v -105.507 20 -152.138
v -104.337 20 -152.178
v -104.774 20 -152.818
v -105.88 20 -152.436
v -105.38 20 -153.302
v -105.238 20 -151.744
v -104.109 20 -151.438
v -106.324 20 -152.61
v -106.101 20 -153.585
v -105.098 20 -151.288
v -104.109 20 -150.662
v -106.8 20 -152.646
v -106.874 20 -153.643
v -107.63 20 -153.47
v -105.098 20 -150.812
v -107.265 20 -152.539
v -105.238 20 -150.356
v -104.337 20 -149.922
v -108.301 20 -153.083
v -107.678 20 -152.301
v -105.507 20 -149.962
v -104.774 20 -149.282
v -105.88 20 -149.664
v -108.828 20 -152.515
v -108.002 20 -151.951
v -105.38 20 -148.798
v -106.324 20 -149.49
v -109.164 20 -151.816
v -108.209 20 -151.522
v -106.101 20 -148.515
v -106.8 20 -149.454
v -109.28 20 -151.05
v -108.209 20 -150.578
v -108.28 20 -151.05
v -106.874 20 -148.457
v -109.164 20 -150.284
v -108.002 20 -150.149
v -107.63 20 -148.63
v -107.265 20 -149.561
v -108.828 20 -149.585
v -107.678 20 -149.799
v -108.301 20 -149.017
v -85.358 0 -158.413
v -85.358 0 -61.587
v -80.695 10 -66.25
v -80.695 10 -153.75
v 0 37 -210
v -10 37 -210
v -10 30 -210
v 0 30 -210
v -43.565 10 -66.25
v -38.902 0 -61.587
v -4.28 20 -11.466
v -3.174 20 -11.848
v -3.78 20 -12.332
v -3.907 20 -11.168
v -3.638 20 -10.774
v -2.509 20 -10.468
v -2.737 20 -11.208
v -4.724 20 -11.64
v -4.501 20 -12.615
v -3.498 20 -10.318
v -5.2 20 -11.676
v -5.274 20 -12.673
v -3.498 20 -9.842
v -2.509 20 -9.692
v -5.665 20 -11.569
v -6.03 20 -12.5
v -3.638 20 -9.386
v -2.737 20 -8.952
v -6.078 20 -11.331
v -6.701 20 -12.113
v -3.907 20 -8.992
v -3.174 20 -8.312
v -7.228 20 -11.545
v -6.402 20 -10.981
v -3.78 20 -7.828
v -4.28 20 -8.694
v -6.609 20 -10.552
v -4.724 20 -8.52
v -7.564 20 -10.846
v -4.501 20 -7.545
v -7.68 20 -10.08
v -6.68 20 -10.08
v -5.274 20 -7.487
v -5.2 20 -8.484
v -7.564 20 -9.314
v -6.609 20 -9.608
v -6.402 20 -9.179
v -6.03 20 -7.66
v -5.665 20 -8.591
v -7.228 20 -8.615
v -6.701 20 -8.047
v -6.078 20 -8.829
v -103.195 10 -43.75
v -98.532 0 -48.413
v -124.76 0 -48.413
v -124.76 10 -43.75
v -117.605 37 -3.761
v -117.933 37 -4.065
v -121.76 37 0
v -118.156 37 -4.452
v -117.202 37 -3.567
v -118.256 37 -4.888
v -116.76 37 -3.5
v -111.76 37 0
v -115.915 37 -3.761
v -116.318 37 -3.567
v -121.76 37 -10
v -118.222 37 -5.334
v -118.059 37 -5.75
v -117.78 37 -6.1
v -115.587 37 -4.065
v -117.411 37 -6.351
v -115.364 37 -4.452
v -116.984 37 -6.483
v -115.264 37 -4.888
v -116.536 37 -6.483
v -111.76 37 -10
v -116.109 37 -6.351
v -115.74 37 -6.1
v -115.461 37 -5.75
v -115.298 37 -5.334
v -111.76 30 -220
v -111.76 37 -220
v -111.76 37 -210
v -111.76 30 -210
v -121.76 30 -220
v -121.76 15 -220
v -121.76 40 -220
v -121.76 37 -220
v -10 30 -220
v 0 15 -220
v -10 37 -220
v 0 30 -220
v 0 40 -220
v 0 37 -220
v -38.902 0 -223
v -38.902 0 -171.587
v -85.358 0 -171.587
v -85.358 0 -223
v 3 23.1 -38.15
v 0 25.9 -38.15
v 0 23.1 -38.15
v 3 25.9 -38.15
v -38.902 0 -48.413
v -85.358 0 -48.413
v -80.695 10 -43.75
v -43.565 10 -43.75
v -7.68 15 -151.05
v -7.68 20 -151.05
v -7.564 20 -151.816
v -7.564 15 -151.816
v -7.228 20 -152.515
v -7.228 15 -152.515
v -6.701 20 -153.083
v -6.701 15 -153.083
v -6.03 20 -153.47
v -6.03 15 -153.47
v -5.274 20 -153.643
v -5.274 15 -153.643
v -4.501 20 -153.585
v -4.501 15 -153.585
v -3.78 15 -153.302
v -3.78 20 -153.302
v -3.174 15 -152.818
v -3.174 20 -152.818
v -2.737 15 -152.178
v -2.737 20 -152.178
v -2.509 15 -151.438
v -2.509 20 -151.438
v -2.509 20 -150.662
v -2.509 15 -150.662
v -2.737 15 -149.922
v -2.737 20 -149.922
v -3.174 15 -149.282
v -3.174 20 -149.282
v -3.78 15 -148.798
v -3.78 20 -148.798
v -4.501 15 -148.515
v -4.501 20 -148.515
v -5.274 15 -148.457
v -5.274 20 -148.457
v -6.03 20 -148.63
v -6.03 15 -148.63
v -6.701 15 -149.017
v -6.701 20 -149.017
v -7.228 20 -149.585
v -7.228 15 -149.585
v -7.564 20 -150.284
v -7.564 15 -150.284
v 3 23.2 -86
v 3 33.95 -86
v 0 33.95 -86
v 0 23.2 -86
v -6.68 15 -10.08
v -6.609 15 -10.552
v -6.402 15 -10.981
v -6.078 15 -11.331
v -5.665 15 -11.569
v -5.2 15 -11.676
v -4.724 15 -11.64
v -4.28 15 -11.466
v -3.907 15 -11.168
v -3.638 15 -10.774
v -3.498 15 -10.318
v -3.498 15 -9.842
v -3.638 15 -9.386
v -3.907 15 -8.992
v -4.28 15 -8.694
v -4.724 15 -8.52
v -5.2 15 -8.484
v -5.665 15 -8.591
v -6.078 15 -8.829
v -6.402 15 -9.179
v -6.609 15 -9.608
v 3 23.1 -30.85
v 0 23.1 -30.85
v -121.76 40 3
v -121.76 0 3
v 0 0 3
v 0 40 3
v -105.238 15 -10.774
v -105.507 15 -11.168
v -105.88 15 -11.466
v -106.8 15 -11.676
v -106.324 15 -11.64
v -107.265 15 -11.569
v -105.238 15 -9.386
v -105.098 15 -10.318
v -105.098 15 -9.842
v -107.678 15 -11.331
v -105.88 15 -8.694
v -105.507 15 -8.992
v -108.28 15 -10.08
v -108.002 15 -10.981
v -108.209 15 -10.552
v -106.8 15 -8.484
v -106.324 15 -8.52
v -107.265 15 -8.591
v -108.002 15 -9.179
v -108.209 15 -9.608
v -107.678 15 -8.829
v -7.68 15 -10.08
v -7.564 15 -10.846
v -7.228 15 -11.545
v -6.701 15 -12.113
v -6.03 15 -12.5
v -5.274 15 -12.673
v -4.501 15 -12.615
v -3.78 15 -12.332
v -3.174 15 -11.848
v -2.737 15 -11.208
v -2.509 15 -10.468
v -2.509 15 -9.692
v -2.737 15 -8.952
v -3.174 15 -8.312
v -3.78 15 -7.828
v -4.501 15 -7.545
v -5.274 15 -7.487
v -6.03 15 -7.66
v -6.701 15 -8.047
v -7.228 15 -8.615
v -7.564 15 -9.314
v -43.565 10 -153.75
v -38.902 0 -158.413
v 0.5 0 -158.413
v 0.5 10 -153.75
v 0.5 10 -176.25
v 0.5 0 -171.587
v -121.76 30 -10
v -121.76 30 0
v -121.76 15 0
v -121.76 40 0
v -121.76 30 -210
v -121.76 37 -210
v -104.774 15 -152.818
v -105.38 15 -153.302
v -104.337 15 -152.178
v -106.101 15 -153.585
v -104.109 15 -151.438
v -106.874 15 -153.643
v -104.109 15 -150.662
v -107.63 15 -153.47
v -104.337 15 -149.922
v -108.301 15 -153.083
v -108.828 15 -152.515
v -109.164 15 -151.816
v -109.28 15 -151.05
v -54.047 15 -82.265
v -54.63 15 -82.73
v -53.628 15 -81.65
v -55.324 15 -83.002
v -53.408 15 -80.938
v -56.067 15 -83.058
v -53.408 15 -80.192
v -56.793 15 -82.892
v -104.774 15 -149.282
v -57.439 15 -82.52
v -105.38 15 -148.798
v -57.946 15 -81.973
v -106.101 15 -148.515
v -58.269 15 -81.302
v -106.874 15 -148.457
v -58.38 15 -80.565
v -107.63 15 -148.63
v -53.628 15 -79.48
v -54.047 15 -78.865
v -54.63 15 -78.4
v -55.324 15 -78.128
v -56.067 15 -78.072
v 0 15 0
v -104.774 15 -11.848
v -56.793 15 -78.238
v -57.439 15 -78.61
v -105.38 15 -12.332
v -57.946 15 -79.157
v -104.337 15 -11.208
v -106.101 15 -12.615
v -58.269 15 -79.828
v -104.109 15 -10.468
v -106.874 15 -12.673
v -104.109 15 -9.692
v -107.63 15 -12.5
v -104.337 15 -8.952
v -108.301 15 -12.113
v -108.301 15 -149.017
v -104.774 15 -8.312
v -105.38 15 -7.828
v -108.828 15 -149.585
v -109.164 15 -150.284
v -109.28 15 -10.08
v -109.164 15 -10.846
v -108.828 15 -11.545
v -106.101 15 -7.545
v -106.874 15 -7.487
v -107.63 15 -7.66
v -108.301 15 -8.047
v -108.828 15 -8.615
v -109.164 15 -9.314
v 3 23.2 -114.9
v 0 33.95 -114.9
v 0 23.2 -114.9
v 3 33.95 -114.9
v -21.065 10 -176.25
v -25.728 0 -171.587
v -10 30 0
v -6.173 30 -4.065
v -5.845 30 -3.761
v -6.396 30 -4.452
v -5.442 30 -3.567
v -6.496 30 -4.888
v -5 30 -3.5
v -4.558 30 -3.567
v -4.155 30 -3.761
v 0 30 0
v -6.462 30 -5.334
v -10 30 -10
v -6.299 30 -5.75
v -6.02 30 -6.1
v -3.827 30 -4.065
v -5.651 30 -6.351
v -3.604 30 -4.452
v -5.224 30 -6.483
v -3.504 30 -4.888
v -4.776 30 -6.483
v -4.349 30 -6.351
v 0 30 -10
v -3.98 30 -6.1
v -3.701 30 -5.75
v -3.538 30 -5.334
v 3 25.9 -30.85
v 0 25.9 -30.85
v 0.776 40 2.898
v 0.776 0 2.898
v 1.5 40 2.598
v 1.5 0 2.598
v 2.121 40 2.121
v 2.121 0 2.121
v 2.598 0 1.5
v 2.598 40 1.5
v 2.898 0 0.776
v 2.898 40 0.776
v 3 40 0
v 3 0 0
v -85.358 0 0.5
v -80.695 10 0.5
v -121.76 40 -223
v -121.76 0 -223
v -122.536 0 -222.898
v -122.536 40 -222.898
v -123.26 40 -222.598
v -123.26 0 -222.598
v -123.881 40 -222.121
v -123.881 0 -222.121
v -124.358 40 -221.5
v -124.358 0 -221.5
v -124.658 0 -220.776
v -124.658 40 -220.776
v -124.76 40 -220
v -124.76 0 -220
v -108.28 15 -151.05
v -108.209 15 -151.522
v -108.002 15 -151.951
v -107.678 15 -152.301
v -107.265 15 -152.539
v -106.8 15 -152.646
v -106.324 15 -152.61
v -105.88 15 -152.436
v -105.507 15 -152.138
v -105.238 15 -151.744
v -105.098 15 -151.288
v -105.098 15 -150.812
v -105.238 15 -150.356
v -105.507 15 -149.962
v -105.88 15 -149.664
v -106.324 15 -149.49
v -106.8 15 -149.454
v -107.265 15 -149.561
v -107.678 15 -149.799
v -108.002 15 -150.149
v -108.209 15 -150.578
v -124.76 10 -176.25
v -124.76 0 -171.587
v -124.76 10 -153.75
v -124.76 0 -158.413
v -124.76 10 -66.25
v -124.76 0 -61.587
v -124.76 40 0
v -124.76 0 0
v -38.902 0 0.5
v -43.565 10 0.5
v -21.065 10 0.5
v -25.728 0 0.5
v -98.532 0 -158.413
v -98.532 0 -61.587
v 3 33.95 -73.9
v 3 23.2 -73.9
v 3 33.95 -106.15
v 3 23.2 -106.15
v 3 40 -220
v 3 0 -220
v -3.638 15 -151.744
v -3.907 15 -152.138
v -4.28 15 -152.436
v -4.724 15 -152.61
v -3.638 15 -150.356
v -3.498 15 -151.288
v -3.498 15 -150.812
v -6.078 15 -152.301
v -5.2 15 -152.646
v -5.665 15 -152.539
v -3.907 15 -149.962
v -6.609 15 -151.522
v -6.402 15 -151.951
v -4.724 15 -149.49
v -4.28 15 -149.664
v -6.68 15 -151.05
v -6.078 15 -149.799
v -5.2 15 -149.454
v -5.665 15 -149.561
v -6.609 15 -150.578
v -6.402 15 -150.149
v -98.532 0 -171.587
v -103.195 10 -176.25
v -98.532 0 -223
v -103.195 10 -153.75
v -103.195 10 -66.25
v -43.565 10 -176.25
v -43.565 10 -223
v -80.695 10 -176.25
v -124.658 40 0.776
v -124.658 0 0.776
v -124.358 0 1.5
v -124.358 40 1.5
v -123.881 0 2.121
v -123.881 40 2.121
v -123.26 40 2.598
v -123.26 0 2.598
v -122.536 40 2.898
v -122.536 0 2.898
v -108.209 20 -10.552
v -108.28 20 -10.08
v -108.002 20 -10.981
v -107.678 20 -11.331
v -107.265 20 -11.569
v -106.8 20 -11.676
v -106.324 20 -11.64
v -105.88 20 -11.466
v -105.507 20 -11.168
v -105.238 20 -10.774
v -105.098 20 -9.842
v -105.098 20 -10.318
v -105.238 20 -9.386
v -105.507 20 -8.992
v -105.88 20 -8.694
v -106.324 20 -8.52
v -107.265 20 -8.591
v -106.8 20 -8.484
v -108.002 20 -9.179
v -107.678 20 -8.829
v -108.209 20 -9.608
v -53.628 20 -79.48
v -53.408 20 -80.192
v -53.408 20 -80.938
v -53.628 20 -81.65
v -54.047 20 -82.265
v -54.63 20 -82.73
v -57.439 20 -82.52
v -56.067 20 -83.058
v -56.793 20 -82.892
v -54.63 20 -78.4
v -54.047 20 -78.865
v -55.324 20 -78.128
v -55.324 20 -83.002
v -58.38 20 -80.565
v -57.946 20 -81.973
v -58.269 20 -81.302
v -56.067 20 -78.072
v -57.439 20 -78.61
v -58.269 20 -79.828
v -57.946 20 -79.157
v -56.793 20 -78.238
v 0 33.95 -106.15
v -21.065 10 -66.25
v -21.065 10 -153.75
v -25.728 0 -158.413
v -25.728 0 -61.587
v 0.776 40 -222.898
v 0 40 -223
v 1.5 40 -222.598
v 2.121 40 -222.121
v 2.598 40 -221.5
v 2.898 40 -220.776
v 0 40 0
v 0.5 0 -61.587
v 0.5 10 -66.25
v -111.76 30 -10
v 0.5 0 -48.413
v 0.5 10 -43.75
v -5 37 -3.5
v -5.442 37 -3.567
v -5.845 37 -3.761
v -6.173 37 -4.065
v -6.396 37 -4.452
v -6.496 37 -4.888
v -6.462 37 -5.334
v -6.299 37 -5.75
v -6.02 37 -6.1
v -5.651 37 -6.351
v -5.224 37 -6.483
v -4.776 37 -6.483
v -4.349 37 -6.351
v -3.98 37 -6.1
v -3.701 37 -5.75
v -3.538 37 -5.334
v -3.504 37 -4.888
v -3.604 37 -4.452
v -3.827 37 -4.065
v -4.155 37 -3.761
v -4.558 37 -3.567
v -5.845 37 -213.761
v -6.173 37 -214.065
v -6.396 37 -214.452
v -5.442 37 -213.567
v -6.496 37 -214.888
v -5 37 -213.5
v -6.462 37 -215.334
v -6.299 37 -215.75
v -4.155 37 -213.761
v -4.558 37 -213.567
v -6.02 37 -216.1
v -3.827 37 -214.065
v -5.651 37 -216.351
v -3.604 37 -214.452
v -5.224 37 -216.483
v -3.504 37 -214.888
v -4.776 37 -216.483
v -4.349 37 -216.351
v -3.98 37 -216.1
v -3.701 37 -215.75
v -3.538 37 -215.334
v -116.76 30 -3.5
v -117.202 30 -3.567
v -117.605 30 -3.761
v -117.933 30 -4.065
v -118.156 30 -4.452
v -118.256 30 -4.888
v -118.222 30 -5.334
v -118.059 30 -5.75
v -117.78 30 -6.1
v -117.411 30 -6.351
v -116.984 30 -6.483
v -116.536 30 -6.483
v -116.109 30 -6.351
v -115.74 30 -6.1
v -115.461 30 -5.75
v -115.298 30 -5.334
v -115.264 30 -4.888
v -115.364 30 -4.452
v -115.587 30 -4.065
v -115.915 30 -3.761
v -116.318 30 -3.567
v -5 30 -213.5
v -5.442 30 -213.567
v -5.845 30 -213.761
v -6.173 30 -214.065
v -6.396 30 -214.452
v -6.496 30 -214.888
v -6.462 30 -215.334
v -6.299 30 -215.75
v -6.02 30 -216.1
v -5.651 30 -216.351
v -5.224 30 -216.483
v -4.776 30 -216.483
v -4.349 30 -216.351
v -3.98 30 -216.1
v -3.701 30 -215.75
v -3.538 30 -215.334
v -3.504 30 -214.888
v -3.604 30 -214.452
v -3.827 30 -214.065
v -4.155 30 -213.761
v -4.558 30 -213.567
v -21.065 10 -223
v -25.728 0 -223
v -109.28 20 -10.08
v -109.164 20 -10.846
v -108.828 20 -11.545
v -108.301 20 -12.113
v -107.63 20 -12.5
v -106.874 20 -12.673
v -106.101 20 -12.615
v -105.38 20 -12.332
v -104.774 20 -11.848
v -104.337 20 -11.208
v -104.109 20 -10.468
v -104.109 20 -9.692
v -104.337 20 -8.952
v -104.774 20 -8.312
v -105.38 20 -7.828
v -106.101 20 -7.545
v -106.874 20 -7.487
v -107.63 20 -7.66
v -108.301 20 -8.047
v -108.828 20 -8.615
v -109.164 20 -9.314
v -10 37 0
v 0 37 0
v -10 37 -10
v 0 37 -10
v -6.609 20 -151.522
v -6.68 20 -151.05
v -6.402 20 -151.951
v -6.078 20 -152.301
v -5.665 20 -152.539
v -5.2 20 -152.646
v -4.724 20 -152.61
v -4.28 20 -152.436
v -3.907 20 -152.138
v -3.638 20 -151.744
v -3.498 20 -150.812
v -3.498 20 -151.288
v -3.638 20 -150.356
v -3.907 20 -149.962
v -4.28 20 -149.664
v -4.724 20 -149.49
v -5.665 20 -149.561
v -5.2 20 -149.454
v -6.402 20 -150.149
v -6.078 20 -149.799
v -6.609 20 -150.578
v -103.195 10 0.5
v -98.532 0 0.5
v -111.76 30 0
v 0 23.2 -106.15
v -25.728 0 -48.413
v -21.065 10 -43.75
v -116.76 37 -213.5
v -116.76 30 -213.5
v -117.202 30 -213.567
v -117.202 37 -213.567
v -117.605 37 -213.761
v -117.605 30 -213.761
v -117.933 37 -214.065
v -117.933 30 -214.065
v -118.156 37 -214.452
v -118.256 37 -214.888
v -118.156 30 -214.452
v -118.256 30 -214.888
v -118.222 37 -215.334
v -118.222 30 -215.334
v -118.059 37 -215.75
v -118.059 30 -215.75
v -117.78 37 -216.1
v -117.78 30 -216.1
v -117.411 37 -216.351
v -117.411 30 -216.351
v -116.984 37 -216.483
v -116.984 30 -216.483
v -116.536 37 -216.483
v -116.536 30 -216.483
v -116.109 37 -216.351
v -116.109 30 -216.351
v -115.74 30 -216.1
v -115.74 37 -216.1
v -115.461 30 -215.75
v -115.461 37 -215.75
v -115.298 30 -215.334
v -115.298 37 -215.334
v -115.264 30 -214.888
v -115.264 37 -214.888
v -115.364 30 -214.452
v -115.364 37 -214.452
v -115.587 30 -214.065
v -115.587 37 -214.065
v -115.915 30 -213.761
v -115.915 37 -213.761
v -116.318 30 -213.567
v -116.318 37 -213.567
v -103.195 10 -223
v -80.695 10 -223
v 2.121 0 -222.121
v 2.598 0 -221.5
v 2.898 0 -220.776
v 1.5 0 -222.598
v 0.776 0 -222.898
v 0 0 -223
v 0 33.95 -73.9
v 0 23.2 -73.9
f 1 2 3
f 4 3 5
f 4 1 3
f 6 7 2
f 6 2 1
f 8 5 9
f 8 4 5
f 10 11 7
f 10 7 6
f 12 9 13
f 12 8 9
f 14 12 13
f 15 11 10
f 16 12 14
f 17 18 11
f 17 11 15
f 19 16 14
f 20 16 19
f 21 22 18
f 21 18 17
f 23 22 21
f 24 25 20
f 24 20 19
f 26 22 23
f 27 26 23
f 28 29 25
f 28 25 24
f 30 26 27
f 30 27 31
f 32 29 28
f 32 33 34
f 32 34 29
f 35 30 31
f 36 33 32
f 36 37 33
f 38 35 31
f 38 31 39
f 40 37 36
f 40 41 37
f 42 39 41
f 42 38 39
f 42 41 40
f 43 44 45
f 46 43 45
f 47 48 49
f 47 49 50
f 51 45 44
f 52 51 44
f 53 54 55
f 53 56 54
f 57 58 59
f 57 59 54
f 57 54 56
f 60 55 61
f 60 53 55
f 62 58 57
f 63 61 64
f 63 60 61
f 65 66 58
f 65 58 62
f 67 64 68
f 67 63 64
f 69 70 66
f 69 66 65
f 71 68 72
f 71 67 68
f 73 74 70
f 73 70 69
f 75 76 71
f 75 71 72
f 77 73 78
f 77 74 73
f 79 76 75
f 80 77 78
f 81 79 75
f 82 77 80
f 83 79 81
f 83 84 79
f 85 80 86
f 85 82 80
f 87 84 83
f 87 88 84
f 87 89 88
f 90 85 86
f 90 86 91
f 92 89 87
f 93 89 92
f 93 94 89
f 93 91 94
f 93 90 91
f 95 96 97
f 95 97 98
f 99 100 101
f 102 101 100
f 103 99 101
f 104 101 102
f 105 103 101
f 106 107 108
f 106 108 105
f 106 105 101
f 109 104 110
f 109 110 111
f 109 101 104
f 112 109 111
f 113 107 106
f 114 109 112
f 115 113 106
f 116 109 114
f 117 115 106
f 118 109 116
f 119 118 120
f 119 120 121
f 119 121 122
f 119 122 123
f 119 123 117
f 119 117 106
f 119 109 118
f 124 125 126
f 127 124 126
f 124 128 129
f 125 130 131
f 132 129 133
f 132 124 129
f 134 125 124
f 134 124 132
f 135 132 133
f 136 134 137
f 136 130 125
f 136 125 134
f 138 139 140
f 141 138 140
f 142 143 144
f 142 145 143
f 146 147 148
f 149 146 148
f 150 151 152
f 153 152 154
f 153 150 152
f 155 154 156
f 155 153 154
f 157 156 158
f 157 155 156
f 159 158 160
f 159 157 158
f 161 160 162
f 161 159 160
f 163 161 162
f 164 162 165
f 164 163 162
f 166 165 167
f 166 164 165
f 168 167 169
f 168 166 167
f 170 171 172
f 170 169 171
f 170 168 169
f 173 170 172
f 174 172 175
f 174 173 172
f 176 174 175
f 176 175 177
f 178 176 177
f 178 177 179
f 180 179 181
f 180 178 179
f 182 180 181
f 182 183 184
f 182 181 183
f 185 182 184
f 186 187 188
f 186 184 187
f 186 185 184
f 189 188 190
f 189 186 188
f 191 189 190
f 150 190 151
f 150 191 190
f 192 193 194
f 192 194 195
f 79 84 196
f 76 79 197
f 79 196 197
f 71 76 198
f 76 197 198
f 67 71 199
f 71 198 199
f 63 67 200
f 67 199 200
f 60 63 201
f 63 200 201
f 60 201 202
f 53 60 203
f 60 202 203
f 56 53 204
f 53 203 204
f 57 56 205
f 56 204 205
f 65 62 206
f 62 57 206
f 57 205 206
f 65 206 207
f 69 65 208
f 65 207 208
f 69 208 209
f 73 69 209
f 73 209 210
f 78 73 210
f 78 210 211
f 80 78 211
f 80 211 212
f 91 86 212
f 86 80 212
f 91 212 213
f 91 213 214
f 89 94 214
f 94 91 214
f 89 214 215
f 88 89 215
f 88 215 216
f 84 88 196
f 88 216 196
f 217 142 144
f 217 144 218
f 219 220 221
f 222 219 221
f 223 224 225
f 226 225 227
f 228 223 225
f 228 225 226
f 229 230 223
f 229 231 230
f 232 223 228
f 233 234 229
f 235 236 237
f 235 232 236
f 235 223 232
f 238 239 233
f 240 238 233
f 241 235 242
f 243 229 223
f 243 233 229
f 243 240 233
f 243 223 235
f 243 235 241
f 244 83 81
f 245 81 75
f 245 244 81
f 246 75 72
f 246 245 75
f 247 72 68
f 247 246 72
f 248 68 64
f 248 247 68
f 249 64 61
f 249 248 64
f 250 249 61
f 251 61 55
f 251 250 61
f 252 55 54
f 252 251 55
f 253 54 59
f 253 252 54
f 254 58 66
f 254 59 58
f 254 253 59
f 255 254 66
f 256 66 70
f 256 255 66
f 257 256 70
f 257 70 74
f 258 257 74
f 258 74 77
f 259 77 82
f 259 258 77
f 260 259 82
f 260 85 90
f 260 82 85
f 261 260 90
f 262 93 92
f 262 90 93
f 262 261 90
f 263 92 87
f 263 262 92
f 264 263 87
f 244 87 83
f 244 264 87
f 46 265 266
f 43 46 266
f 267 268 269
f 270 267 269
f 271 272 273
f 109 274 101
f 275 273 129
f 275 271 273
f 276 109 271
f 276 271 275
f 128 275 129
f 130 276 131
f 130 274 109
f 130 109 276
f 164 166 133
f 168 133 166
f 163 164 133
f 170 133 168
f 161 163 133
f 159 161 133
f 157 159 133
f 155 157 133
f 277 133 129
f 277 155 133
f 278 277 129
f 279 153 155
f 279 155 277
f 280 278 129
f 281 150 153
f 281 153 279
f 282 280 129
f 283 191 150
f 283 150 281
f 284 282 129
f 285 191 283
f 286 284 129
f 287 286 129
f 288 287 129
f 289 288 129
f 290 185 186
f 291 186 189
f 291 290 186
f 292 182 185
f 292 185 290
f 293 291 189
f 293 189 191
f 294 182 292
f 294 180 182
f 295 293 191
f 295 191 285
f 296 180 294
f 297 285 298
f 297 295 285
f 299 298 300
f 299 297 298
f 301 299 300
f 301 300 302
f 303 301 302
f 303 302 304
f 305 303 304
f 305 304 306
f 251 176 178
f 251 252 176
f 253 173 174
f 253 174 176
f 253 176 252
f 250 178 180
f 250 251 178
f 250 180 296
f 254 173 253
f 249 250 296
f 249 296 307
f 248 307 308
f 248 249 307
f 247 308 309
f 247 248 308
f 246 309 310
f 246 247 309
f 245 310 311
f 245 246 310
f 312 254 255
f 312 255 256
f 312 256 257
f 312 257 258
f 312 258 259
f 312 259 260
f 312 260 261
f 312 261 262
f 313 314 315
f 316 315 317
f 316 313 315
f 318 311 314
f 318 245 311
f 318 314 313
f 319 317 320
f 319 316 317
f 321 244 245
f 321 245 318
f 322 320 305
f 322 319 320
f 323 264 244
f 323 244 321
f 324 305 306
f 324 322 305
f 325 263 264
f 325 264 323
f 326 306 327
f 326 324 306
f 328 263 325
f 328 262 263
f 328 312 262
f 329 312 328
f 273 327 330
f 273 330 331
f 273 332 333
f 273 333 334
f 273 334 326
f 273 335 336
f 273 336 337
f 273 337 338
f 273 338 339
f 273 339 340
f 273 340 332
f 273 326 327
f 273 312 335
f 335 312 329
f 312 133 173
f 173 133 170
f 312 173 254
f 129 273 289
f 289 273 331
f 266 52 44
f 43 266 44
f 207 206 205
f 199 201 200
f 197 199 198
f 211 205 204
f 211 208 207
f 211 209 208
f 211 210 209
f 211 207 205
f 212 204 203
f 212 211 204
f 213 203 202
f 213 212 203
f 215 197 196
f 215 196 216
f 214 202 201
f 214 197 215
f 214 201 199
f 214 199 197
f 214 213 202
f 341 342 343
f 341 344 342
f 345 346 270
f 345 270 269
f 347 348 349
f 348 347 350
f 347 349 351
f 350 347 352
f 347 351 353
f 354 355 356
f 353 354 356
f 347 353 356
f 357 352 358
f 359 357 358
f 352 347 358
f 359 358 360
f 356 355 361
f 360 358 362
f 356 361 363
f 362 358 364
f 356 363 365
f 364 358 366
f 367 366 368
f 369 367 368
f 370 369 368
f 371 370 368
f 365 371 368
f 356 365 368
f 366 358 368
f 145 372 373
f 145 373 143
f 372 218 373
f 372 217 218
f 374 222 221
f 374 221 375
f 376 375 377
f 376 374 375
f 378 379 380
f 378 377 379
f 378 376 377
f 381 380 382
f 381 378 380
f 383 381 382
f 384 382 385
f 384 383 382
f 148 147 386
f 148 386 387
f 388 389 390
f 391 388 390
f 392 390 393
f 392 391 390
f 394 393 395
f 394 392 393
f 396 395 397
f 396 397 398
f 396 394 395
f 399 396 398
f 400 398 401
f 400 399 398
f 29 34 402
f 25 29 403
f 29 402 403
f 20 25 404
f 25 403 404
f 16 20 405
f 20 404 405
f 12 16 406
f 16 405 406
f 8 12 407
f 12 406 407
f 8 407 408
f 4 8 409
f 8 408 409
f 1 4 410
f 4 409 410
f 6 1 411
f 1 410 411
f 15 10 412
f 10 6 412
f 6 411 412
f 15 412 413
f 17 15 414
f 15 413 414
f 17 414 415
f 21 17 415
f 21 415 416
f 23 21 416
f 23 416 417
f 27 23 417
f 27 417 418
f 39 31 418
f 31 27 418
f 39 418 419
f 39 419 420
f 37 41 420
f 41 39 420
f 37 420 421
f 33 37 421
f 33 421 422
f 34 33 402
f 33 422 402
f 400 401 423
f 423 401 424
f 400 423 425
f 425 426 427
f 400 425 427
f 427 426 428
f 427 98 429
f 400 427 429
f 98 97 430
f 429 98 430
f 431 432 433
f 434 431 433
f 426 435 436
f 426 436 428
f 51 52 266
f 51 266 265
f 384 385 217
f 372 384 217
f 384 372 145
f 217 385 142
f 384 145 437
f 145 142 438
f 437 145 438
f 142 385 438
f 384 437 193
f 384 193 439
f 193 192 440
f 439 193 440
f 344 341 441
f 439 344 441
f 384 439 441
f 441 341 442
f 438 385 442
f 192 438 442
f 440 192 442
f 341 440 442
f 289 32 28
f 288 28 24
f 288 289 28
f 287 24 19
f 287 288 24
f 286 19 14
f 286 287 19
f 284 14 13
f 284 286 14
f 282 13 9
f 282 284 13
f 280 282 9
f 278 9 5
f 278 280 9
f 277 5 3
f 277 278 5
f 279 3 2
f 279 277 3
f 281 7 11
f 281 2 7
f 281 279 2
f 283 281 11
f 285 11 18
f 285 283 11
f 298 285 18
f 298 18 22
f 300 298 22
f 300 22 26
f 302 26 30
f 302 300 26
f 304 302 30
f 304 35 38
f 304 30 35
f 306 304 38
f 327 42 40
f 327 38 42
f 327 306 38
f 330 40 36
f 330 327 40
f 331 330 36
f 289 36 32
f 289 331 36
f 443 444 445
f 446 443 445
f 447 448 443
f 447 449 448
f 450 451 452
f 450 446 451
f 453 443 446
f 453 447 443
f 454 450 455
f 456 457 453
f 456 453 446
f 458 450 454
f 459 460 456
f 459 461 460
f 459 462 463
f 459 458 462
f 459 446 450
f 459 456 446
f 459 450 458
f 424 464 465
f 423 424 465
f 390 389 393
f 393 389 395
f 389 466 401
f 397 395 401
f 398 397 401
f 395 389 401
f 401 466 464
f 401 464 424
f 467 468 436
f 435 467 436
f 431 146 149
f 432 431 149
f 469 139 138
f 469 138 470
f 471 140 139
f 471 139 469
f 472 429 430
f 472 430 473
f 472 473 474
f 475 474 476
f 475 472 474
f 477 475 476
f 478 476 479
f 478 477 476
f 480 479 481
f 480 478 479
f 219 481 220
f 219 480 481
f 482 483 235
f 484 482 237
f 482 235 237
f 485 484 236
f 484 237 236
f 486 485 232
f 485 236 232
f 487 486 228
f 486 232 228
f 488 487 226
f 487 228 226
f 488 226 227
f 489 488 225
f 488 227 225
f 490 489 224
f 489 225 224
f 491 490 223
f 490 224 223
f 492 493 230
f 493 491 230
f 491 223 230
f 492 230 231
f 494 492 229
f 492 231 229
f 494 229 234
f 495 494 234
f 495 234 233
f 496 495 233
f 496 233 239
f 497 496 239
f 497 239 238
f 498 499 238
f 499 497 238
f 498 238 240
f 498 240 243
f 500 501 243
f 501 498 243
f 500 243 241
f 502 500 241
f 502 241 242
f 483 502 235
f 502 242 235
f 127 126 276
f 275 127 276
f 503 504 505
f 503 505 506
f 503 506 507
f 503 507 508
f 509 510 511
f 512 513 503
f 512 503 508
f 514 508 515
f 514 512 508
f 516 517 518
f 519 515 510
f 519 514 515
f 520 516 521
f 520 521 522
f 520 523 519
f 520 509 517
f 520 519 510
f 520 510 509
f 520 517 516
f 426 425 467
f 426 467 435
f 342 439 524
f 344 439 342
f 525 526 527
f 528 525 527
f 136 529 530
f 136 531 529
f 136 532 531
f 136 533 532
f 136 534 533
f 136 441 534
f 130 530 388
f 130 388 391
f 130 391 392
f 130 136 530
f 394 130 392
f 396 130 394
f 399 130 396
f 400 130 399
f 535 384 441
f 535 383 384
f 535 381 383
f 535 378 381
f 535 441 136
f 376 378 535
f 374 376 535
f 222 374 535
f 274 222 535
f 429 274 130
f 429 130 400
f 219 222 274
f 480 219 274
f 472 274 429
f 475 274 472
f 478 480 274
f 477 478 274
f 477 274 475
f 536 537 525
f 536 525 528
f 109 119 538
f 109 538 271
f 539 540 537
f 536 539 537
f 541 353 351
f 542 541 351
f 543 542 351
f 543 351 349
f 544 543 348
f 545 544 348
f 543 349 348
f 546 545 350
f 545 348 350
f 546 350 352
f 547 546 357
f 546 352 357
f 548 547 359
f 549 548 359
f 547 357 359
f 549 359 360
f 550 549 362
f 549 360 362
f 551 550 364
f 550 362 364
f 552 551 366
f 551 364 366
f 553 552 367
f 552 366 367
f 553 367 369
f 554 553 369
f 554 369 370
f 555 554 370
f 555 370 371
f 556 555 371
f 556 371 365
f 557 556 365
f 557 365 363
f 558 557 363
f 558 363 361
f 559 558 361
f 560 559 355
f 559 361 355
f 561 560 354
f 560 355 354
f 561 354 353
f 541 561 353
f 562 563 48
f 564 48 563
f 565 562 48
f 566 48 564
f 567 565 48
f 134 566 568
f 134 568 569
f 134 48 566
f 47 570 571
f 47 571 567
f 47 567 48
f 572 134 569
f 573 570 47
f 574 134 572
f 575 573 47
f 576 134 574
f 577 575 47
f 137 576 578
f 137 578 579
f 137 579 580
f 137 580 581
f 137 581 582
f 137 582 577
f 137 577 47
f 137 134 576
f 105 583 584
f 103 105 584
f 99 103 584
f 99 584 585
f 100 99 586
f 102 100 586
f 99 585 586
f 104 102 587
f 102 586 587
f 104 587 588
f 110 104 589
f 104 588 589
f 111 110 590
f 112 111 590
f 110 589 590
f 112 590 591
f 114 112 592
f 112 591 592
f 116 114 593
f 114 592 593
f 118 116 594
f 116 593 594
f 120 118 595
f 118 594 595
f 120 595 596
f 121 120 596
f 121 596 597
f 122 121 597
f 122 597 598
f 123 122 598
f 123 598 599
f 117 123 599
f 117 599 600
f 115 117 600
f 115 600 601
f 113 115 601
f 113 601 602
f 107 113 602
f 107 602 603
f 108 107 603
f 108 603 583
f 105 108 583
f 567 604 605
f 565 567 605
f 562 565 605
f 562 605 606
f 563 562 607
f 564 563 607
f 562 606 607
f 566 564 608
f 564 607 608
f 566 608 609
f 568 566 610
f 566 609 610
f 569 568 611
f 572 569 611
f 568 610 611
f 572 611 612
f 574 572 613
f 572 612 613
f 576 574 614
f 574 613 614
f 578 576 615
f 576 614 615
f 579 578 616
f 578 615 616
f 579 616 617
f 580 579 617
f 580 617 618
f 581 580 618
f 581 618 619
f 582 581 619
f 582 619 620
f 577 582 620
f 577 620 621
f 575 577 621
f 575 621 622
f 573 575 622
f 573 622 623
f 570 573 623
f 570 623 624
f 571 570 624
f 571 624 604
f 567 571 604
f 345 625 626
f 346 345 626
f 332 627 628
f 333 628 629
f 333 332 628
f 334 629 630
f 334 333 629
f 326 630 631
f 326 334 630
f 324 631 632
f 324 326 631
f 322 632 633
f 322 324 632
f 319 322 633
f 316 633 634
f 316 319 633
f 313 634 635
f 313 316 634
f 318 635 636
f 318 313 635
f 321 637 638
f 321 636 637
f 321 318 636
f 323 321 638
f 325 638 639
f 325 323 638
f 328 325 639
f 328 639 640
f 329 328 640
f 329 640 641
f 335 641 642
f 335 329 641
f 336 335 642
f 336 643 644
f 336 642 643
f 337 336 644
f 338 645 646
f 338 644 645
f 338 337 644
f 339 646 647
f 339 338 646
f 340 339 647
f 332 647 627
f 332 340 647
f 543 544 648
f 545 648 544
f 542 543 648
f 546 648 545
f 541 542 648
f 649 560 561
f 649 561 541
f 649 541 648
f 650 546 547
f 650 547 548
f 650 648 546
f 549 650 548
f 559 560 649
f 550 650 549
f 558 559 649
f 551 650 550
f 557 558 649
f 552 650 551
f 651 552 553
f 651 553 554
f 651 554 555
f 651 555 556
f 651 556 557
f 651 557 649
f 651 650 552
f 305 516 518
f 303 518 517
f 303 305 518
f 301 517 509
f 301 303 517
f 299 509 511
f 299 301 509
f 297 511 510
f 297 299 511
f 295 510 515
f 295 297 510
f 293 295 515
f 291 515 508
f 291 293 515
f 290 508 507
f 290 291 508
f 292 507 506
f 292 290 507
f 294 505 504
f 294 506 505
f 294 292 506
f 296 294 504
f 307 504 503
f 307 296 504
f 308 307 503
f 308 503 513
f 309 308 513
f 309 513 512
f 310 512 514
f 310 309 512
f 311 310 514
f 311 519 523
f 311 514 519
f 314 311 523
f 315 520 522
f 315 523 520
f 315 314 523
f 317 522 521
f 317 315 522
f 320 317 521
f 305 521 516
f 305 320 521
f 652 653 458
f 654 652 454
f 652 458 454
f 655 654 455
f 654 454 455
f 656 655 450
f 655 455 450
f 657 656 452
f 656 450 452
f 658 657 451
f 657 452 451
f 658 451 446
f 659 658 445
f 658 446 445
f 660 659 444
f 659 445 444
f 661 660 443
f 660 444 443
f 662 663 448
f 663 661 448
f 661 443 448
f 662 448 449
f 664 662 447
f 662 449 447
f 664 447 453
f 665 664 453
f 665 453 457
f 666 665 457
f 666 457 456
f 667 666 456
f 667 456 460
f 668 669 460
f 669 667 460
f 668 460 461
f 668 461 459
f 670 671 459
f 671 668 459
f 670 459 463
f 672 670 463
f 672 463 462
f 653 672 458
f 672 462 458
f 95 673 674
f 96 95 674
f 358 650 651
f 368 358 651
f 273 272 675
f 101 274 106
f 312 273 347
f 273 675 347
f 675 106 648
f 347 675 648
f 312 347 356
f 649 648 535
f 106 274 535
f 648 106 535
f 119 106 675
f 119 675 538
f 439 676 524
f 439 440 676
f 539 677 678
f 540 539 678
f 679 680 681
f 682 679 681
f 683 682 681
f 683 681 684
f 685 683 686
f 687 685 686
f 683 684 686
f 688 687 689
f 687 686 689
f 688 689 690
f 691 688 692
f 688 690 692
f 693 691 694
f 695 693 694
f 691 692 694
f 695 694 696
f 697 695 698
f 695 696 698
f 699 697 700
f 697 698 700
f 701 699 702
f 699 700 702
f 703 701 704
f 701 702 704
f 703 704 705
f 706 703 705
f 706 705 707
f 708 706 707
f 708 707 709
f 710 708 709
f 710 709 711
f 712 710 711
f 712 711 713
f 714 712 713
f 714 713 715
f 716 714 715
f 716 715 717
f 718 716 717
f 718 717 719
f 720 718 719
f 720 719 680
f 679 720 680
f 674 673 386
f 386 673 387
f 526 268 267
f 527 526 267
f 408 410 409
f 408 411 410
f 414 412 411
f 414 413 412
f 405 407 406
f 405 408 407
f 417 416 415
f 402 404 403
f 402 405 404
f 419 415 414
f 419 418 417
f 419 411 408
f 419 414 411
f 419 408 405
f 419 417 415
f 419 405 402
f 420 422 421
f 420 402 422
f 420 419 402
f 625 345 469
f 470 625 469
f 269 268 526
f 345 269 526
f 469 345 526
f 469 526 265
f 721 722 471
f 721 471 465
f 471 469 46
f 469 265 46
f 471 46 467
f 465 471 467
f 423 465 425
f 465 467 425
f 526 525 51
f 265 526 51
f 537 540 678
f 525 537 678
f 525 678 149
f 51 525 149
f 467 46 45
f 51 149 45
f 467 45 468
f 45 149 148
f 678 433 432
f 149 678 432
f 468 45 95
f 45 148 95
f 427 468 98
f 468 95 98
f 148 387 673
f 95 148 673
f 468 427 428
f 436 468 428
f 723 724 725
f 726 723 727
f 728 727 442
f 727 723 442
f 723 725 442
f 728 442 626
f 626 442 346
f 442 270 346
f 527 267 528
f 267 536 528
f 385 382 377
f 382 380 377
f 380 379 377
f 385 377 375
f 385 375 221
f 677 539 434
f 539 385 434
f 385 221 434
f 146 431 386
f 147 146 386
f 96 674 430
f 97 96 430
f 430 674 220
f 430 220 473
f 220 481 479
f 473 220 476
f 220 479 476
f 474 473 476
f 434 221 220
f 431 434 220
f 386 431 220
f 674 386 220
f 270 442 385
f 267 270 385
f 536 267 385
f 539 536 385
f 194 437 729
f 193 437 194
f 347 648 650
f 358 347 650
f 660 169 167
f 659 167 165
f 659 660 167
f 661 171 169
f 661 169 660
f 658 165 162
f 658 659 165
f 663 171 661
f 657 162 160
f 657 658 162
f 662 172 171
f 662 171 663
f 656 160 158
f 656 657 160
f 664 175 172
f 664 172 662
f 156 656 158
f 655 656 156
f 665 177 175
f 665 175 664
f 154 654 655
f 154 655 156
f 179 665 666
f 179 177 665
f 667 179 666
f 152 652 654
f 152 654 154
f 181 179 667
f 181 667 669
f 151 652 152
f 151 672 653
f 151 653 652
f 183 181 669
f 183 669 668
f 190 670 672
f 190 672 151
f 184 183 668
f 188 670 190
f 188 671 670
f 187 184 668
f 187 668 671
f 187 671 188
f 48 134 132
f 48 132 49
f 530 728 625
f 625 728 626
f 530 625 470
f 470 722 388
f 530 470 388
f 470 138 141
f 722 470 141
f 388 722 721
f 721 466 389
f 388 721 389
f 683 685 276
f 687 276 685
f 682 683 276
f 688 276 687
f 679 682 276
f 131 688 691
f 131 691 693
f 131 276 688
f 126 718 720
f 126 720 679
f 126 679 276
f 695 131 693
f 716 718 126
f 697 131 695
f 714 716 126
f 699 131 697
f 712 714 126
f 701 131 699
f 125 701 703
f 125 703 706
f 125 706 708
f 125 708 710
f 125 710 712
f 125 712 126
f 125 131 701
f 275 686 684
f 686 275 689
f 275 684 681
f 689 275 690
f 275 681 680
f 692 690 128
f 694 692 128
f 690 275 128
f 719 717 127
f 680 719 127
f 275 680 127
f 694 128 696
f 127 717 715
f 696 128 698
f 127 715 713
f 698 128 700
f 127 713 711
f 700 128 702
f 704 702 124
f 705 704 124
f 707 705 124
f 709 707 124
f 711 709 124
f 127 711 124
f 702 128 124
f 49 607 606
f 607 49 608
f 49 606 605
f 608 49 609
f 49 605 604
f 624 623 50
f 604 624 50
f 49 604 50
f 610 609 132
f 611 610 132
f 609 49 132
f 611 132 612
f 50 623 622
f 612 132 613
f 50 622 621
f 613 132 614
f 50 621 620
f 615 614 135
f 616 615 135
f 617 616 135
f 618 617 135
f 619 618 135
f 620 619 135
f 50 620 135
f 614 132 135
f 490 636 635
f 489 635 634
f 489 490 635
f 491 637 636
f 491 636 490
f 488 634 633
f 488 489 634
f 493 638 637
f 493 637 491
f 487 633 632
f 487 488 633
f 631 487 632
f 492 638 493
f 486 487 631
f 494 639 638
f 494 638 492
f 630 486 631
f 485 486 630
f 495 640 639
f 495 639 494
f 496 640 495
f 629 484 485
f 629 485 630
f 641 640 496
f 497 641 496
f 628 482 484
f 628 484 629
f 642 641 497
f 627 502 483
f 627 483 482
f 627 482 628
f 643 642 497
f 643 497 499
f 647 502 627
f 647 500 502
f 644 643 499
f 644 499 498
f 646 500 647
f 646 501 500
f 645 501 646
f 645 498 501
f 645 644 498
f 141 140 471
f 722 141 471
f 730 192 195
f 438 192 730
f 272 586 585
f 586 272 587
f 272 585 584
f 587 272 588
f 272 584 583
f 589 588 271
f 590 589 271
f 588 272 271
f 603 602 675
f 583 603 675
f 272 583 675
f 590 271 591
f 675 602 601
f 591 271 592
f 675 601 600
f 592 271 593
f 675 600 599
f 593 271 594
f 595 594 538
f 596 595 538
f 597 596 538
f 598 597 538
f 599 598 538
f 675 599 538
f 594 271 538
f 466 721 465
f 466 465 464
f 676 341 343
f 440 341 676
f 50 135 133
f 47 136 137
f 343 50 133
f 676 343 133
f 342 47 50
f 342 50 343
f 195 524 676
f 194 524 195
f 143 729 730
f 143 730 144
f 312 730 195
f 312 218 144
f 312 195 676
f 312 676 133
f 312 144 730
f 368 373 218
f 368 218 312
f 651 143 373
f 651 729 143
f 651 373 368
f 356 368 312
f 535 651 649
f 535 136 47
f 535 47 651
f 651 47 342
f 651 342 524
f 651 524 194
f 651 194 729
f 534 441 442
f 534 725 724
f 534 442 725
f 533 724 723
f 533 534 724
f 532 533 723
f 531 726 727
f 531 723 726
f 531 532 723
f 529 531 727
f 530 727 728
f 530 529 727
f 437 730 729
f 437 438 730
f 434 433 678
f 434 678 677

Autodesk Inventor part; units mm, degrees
ref_plane "YZ Plane" through (0, 0, 0) normal (1, 0, 0) x (0, 1, 0)
ref_plane "XZ Plane" through (0, 0, 0) normal (0, 1, 0) x (-1, 0, 0)
ref_plane "XY Plane" through (0, 0, 0) normal (0, 0, 1) x (1, 0, 0)
sketch "Sketch1" plane through (0, 0, 0) normal (0, 1, 0) x (-1, 0, 0)
  line L0 (0, 0) -> (121.76, 0)
  line L1 (121.76, 0) -> (121.76, -220)
  line L2 (121.76, -220) -> (0, -220)
  line L3 (0, -220) -> (0, 0)
  line L4 (124.76, -223) -> (124.76, 3)
  line L5 (124.76, 3) -> (-3, 3)
  line L6 (-3, 3) -> (-3, -223)
  line L7 (-3, -223) -> (124.76, -223)
  circle A0 centre (5.08, -10.08) radius 1.6
  circle A1 centre (5.08, -10.08) radius 2.6
  circle A2 centre (55.88, -80.565) radius 2.5
  circle A3 centre (5.08, -151.05) radius 1.6
  circle A4 centre (5.08, -151.05) radius 2.6
  circle A5 centre (106.68, -10.08) radius 1.6
  circle A6 centre (106.68, -10.08) radius 2.6
  circle A7 centre (106.68, -151.05) radius 1.6
  circle A8 centre (106.68, -151.05) radius 2.6
  dimension "d0" = 121.76
  dimension "d1" = 220
  dimension "d2" = 3
  dimension "d22" = 3.2
  dimension "d23" = 1
  dimension "d24" = 5.08
  dimension "d25" = 10.08
  dimension "d26" = 5
  dimension "d35" = 3.2
  dimension "d36" = 1
  dimension "d37" = 140.97
  dimension "d38" = 0
  dimension "d39" = 3.2
  dimension "d40" = 1
  dimension "d41" = 101.6
  dimension "d42" = 0
  dimension "d43" = 3.2
  dimension "d44" = 1
  dimension "d45" = 0
  dimension "d46" = 0
  dimension "d47" = 50.8
  dimension "d48" = 70.485
extrude "Extrusion1" add sketch "Sketch1" along normal blind 15 contours L0 L1 L2 L3 | A0 | A1 | A2 | A3 | A4 | A5 | A6 | A7 | A8
extrude "Extrusion2" add sketch "Sketch1" along normal blind 40 contours L7 L6 L5 L4
fillet "Fillet1" radius 3 4 edges at (3, 20, -223) (-124.76, 20, -223) (-124.76, 20, 3) (3, 20, 3)
sketch "Sketch2" plane through (3, 0, 0) normal (1, 0, 0) x (0, 0, -1)
  line L0 (220, 15) -> (0, 15) construction
  line L1 (0, 15) -> (220, 15)
  line L2 (73.9, 33.95) -> (86, 33.95)
  line L3 (86, 33.95) -> (86, 23.2)
  line L4 (86, 23.2) -> (73.9, 23.2)
  line L5 (73.9, 23.2) -> (73.9, 33.95)
  line L6 (106.15, 33.95) -> (114.9, 33.95)
  line L7 (114.9, 33.95) -> (114.9, 23.2)
  line L8 (114.9, 23.2) -> (106.15, 23.2)
  line L9 (106.15, 23.2) -> (106.15, 33.95)
  line L10 (0, 0) -> (0, 40) projected
  line L11 (30.85, 25.9) -> (38.15, 25.9)
  line L12 (38.15, 25.9) -> (38.15, 23.1)
  line L13 (38.15, 23.1) -> (30.85, 23.1)
  line L14 (30.85, 23.1) -> (30.85, 25.9)
  line L15 (110, 15) -> (110, 0) construction
  line L16 (220, 0) -> (0, 0) projected
  line L17 (48.413, 0) -> (43.7499, 10)
  line L18 (43.7499, 10) -> (66.2501, 10)
  line L19 (66.2501, 10) -> (61.587, 0)
  line L20 (48.413, 0) -> (61.587, 0)
  line L21 (55, 0) -> (55, 15) construction
  line L22 (171.587, 0) -> (176.2501, 10)
  line L23 (176.2501, 10) -> (153.7499, 10)
  line L24 (153.7499, 10) -> (158.413, 0)
  line L25 (171.587, 0) -> (158.413, 0)
  point P0 (110, 7.5)
  point P1 (55, 0)
  point P2 (158.413, 0)
  dimension "d9" = 12.1
  dimension "d10" = 10.75
  dimension "d11" = 8.2
  dimension "d12" = 8.75
  dimension "d13" = 10.75
  dimension "d14" = 8.2
  dimension "d15" = 20.15
  dimension "d19" = 7.3
  dimension "d20" = 2.8
  dimension "d21" = 8.1
  dimension "d49" = 35.75
  dimension "d50" = 30.85
  dimension "d72" = 13.174
  dimension "d73" = 65
  dimension "d74" = 65
  dimension "d75" = 10
  dimension "d76" = 55
extrude "Extrusion3" cut sketch "Sketch2" against normal up to surface (3 mm away) contours L2 L3 L4 L5 | L6 L7 L8 L9 | L11 L12 L13 L14
extrude "Extrusion4" add sketch "Sketch1" along normal blind 20 contours A1 | A2 | A4 | A6 | A8
sketch "Sketch3" plane through (0, 40, 0) normal (0, 1, 0) x (1, 0, 0)
  line L0 (-121.76, 0) -> (-121.76, 220) projected
  line L1 (-121.76, 110) -> (0, 110) construction
  line L2 (0, 220) -> (0, 0) projected
  line L3 (-121.76, 0) -> (0, 0) projected
  line L4 (-60.88, 0) -> (-60.88, 220) construction
  line L5 (-121.76, 220) -> (0, 220) projected
  line L6 (0, 0) -> (-10, 0)
  line L7 (-10, 0) -> (-10, 10)
  line L8 (-10, 10) -> (0, 10)
  line L9 (0, 10) -> (0, 0)
  line L10 (-121.76, 0) -> (-111.76, 0)
  line L11 (-111.76, 0) -> (-111.76, 10)
  line L12 (-111.76, 10) -> (-121.76, 10)
  line L13 (-121.76, 10) -> (-121.76, 0)
  line L14 (0, 220) -> (-10, 220)
  line L15 (-10, 220) -> (-10, 210)
  line L16 (-10, 210) -> (0, 210)
  line L17 (0, 210) -> (0, 220)
  line L18 (-121.76, 220) -> (-111.76, 220)
  line L19 (-111.76, 220) -> (-111.76, 210)
  line L20 (-111.76, 210) -> (-121.76, 210)
  line L21 (-121.76, 210) -> (-121.76, 220)
  line L22 (-121.76, 0) -> (0, 0)
  line L23 (0, 0) -> (0, 220)
  line L24 (0, 220) -> (-121.76, 220)
  line L25 (-121.76, 220) -> (-121.76, 0)
  point P0 (0, 210)
  dimension "d51" = 10
  dimension "d52" = 10
extrude "Extrusion6" add sketch "Sketch3" against normal blind 10 contours L0 L12 L11 L3 | L0 L5 L19 L20 | L7 L8 L2 L3 | L5 L2 L16 L15
sketch "Sketch4" plane through (0, 40, 0) normal (0, 1, 0) x (1, 0, 0)
  line L0 (-10, 10) -> (-10, 0) projected
  line L1 (0, 10) -> (-10, 10) projected
  line L2 (-10, 220) -> (-10, 210) projected
  line L3 (-10, 210) -> (0, 210) projected
  line L4 (-121.76, 210) -> (-111.76, 210) projected
  line L5 (-111.76, 210) -> (-111.76, 220) projected
  line L6 (-111.76, 0) -> (-111.76, 10) projected
  line L7 (-111.76, 10) -> (-121.76, 10) projected
  point P0 (0, 0)
  point P1 (-5, 5)
  point P2 (-116.76, 5)
  point P3 (-116.76, 215)
  point P4 (-5, 215)
  dimension "d55" = 5
  dimension "d63" = 5
  dimension "d64" = 5
  dimension "d65" = 5
  dimension "d66" = 5
  dimension "d67" = 5
  dimension "d68" = 5
  dimension "d69" = 5
hole "Hole1" at (-5, 40, -5) at (-5, 40, -215) at (-116.76, 40, -215) at (-116.76, 40, -5) direction (0, -1, 0) diameter 3 depth 10
extrude "Extrusion7" cut sketch "Sketch3" against normal blind 3
extrude "Extrusion8" cut sketch "Sketch2" against normal up to surface (127.76 mm away) contours L16 L17 L18 L19 | L16 L24 L23 L22
extrude "Extrusion9" add sketch "Sketch2" against normal blind 2.5 contours L16 L17 L18 L19 | L16 L24 L23 L22
sketch "Sketch5" plane through (-121.76, 0, 3) normal (0, 0, 1) x (1, 0, 0)
  line L0 (122.26, 10) -> (-3, 10) projected
  line L1 (59.63, 10) -> (59.63, 0) construction
  line L2 (-3, 0) -> (122.26, 0) projected
  line L3 (29.815, 10) -> (29.815, 0) construction
  line L4 (23.228, 0) -> (36.402, 0)
  line L5 (36.402, 0) -> (41.0651, 10)
  line L6 (41.0651, 10) -> (18.5649, 10)
  line L7 (18.5649, 10) -> (23.228, 0)
  line L8 (89.445, 10) -> (89.445, 0) construction
  line L9 (96.032, 0) -> (82.858, 0)
  line L10 (82.858, 0) -> (78.1949, 10)
  line L11 (78.1949, 10) -> (100.6951, 10)
  line L12 (100.6951, 10) -> (96.032, 0)
  point P0 (121.76, 0)
  point P1 (59.63, 5)
  point P2 (18.5649, 10)
  point P3 (41.0651, 10)
  dimension "d81" = 29.815
  dimension "d82" = 13.174
  dimension "d83" = 65
  dimension "d84" = 65
  dimension "d85" = 10
extrude "Extrusion10" cut sketch "Sketch5" against normal up to surface (226 mm away) contours L12 L2 L10 L0 | L5 L2 L7 L0
extrude "Extrusion11" add sketch "Sketch5" against normal blind 2.5 contours L12 L2 L10 L0 | L5 L2 L7 L0
properties part number "Base"
